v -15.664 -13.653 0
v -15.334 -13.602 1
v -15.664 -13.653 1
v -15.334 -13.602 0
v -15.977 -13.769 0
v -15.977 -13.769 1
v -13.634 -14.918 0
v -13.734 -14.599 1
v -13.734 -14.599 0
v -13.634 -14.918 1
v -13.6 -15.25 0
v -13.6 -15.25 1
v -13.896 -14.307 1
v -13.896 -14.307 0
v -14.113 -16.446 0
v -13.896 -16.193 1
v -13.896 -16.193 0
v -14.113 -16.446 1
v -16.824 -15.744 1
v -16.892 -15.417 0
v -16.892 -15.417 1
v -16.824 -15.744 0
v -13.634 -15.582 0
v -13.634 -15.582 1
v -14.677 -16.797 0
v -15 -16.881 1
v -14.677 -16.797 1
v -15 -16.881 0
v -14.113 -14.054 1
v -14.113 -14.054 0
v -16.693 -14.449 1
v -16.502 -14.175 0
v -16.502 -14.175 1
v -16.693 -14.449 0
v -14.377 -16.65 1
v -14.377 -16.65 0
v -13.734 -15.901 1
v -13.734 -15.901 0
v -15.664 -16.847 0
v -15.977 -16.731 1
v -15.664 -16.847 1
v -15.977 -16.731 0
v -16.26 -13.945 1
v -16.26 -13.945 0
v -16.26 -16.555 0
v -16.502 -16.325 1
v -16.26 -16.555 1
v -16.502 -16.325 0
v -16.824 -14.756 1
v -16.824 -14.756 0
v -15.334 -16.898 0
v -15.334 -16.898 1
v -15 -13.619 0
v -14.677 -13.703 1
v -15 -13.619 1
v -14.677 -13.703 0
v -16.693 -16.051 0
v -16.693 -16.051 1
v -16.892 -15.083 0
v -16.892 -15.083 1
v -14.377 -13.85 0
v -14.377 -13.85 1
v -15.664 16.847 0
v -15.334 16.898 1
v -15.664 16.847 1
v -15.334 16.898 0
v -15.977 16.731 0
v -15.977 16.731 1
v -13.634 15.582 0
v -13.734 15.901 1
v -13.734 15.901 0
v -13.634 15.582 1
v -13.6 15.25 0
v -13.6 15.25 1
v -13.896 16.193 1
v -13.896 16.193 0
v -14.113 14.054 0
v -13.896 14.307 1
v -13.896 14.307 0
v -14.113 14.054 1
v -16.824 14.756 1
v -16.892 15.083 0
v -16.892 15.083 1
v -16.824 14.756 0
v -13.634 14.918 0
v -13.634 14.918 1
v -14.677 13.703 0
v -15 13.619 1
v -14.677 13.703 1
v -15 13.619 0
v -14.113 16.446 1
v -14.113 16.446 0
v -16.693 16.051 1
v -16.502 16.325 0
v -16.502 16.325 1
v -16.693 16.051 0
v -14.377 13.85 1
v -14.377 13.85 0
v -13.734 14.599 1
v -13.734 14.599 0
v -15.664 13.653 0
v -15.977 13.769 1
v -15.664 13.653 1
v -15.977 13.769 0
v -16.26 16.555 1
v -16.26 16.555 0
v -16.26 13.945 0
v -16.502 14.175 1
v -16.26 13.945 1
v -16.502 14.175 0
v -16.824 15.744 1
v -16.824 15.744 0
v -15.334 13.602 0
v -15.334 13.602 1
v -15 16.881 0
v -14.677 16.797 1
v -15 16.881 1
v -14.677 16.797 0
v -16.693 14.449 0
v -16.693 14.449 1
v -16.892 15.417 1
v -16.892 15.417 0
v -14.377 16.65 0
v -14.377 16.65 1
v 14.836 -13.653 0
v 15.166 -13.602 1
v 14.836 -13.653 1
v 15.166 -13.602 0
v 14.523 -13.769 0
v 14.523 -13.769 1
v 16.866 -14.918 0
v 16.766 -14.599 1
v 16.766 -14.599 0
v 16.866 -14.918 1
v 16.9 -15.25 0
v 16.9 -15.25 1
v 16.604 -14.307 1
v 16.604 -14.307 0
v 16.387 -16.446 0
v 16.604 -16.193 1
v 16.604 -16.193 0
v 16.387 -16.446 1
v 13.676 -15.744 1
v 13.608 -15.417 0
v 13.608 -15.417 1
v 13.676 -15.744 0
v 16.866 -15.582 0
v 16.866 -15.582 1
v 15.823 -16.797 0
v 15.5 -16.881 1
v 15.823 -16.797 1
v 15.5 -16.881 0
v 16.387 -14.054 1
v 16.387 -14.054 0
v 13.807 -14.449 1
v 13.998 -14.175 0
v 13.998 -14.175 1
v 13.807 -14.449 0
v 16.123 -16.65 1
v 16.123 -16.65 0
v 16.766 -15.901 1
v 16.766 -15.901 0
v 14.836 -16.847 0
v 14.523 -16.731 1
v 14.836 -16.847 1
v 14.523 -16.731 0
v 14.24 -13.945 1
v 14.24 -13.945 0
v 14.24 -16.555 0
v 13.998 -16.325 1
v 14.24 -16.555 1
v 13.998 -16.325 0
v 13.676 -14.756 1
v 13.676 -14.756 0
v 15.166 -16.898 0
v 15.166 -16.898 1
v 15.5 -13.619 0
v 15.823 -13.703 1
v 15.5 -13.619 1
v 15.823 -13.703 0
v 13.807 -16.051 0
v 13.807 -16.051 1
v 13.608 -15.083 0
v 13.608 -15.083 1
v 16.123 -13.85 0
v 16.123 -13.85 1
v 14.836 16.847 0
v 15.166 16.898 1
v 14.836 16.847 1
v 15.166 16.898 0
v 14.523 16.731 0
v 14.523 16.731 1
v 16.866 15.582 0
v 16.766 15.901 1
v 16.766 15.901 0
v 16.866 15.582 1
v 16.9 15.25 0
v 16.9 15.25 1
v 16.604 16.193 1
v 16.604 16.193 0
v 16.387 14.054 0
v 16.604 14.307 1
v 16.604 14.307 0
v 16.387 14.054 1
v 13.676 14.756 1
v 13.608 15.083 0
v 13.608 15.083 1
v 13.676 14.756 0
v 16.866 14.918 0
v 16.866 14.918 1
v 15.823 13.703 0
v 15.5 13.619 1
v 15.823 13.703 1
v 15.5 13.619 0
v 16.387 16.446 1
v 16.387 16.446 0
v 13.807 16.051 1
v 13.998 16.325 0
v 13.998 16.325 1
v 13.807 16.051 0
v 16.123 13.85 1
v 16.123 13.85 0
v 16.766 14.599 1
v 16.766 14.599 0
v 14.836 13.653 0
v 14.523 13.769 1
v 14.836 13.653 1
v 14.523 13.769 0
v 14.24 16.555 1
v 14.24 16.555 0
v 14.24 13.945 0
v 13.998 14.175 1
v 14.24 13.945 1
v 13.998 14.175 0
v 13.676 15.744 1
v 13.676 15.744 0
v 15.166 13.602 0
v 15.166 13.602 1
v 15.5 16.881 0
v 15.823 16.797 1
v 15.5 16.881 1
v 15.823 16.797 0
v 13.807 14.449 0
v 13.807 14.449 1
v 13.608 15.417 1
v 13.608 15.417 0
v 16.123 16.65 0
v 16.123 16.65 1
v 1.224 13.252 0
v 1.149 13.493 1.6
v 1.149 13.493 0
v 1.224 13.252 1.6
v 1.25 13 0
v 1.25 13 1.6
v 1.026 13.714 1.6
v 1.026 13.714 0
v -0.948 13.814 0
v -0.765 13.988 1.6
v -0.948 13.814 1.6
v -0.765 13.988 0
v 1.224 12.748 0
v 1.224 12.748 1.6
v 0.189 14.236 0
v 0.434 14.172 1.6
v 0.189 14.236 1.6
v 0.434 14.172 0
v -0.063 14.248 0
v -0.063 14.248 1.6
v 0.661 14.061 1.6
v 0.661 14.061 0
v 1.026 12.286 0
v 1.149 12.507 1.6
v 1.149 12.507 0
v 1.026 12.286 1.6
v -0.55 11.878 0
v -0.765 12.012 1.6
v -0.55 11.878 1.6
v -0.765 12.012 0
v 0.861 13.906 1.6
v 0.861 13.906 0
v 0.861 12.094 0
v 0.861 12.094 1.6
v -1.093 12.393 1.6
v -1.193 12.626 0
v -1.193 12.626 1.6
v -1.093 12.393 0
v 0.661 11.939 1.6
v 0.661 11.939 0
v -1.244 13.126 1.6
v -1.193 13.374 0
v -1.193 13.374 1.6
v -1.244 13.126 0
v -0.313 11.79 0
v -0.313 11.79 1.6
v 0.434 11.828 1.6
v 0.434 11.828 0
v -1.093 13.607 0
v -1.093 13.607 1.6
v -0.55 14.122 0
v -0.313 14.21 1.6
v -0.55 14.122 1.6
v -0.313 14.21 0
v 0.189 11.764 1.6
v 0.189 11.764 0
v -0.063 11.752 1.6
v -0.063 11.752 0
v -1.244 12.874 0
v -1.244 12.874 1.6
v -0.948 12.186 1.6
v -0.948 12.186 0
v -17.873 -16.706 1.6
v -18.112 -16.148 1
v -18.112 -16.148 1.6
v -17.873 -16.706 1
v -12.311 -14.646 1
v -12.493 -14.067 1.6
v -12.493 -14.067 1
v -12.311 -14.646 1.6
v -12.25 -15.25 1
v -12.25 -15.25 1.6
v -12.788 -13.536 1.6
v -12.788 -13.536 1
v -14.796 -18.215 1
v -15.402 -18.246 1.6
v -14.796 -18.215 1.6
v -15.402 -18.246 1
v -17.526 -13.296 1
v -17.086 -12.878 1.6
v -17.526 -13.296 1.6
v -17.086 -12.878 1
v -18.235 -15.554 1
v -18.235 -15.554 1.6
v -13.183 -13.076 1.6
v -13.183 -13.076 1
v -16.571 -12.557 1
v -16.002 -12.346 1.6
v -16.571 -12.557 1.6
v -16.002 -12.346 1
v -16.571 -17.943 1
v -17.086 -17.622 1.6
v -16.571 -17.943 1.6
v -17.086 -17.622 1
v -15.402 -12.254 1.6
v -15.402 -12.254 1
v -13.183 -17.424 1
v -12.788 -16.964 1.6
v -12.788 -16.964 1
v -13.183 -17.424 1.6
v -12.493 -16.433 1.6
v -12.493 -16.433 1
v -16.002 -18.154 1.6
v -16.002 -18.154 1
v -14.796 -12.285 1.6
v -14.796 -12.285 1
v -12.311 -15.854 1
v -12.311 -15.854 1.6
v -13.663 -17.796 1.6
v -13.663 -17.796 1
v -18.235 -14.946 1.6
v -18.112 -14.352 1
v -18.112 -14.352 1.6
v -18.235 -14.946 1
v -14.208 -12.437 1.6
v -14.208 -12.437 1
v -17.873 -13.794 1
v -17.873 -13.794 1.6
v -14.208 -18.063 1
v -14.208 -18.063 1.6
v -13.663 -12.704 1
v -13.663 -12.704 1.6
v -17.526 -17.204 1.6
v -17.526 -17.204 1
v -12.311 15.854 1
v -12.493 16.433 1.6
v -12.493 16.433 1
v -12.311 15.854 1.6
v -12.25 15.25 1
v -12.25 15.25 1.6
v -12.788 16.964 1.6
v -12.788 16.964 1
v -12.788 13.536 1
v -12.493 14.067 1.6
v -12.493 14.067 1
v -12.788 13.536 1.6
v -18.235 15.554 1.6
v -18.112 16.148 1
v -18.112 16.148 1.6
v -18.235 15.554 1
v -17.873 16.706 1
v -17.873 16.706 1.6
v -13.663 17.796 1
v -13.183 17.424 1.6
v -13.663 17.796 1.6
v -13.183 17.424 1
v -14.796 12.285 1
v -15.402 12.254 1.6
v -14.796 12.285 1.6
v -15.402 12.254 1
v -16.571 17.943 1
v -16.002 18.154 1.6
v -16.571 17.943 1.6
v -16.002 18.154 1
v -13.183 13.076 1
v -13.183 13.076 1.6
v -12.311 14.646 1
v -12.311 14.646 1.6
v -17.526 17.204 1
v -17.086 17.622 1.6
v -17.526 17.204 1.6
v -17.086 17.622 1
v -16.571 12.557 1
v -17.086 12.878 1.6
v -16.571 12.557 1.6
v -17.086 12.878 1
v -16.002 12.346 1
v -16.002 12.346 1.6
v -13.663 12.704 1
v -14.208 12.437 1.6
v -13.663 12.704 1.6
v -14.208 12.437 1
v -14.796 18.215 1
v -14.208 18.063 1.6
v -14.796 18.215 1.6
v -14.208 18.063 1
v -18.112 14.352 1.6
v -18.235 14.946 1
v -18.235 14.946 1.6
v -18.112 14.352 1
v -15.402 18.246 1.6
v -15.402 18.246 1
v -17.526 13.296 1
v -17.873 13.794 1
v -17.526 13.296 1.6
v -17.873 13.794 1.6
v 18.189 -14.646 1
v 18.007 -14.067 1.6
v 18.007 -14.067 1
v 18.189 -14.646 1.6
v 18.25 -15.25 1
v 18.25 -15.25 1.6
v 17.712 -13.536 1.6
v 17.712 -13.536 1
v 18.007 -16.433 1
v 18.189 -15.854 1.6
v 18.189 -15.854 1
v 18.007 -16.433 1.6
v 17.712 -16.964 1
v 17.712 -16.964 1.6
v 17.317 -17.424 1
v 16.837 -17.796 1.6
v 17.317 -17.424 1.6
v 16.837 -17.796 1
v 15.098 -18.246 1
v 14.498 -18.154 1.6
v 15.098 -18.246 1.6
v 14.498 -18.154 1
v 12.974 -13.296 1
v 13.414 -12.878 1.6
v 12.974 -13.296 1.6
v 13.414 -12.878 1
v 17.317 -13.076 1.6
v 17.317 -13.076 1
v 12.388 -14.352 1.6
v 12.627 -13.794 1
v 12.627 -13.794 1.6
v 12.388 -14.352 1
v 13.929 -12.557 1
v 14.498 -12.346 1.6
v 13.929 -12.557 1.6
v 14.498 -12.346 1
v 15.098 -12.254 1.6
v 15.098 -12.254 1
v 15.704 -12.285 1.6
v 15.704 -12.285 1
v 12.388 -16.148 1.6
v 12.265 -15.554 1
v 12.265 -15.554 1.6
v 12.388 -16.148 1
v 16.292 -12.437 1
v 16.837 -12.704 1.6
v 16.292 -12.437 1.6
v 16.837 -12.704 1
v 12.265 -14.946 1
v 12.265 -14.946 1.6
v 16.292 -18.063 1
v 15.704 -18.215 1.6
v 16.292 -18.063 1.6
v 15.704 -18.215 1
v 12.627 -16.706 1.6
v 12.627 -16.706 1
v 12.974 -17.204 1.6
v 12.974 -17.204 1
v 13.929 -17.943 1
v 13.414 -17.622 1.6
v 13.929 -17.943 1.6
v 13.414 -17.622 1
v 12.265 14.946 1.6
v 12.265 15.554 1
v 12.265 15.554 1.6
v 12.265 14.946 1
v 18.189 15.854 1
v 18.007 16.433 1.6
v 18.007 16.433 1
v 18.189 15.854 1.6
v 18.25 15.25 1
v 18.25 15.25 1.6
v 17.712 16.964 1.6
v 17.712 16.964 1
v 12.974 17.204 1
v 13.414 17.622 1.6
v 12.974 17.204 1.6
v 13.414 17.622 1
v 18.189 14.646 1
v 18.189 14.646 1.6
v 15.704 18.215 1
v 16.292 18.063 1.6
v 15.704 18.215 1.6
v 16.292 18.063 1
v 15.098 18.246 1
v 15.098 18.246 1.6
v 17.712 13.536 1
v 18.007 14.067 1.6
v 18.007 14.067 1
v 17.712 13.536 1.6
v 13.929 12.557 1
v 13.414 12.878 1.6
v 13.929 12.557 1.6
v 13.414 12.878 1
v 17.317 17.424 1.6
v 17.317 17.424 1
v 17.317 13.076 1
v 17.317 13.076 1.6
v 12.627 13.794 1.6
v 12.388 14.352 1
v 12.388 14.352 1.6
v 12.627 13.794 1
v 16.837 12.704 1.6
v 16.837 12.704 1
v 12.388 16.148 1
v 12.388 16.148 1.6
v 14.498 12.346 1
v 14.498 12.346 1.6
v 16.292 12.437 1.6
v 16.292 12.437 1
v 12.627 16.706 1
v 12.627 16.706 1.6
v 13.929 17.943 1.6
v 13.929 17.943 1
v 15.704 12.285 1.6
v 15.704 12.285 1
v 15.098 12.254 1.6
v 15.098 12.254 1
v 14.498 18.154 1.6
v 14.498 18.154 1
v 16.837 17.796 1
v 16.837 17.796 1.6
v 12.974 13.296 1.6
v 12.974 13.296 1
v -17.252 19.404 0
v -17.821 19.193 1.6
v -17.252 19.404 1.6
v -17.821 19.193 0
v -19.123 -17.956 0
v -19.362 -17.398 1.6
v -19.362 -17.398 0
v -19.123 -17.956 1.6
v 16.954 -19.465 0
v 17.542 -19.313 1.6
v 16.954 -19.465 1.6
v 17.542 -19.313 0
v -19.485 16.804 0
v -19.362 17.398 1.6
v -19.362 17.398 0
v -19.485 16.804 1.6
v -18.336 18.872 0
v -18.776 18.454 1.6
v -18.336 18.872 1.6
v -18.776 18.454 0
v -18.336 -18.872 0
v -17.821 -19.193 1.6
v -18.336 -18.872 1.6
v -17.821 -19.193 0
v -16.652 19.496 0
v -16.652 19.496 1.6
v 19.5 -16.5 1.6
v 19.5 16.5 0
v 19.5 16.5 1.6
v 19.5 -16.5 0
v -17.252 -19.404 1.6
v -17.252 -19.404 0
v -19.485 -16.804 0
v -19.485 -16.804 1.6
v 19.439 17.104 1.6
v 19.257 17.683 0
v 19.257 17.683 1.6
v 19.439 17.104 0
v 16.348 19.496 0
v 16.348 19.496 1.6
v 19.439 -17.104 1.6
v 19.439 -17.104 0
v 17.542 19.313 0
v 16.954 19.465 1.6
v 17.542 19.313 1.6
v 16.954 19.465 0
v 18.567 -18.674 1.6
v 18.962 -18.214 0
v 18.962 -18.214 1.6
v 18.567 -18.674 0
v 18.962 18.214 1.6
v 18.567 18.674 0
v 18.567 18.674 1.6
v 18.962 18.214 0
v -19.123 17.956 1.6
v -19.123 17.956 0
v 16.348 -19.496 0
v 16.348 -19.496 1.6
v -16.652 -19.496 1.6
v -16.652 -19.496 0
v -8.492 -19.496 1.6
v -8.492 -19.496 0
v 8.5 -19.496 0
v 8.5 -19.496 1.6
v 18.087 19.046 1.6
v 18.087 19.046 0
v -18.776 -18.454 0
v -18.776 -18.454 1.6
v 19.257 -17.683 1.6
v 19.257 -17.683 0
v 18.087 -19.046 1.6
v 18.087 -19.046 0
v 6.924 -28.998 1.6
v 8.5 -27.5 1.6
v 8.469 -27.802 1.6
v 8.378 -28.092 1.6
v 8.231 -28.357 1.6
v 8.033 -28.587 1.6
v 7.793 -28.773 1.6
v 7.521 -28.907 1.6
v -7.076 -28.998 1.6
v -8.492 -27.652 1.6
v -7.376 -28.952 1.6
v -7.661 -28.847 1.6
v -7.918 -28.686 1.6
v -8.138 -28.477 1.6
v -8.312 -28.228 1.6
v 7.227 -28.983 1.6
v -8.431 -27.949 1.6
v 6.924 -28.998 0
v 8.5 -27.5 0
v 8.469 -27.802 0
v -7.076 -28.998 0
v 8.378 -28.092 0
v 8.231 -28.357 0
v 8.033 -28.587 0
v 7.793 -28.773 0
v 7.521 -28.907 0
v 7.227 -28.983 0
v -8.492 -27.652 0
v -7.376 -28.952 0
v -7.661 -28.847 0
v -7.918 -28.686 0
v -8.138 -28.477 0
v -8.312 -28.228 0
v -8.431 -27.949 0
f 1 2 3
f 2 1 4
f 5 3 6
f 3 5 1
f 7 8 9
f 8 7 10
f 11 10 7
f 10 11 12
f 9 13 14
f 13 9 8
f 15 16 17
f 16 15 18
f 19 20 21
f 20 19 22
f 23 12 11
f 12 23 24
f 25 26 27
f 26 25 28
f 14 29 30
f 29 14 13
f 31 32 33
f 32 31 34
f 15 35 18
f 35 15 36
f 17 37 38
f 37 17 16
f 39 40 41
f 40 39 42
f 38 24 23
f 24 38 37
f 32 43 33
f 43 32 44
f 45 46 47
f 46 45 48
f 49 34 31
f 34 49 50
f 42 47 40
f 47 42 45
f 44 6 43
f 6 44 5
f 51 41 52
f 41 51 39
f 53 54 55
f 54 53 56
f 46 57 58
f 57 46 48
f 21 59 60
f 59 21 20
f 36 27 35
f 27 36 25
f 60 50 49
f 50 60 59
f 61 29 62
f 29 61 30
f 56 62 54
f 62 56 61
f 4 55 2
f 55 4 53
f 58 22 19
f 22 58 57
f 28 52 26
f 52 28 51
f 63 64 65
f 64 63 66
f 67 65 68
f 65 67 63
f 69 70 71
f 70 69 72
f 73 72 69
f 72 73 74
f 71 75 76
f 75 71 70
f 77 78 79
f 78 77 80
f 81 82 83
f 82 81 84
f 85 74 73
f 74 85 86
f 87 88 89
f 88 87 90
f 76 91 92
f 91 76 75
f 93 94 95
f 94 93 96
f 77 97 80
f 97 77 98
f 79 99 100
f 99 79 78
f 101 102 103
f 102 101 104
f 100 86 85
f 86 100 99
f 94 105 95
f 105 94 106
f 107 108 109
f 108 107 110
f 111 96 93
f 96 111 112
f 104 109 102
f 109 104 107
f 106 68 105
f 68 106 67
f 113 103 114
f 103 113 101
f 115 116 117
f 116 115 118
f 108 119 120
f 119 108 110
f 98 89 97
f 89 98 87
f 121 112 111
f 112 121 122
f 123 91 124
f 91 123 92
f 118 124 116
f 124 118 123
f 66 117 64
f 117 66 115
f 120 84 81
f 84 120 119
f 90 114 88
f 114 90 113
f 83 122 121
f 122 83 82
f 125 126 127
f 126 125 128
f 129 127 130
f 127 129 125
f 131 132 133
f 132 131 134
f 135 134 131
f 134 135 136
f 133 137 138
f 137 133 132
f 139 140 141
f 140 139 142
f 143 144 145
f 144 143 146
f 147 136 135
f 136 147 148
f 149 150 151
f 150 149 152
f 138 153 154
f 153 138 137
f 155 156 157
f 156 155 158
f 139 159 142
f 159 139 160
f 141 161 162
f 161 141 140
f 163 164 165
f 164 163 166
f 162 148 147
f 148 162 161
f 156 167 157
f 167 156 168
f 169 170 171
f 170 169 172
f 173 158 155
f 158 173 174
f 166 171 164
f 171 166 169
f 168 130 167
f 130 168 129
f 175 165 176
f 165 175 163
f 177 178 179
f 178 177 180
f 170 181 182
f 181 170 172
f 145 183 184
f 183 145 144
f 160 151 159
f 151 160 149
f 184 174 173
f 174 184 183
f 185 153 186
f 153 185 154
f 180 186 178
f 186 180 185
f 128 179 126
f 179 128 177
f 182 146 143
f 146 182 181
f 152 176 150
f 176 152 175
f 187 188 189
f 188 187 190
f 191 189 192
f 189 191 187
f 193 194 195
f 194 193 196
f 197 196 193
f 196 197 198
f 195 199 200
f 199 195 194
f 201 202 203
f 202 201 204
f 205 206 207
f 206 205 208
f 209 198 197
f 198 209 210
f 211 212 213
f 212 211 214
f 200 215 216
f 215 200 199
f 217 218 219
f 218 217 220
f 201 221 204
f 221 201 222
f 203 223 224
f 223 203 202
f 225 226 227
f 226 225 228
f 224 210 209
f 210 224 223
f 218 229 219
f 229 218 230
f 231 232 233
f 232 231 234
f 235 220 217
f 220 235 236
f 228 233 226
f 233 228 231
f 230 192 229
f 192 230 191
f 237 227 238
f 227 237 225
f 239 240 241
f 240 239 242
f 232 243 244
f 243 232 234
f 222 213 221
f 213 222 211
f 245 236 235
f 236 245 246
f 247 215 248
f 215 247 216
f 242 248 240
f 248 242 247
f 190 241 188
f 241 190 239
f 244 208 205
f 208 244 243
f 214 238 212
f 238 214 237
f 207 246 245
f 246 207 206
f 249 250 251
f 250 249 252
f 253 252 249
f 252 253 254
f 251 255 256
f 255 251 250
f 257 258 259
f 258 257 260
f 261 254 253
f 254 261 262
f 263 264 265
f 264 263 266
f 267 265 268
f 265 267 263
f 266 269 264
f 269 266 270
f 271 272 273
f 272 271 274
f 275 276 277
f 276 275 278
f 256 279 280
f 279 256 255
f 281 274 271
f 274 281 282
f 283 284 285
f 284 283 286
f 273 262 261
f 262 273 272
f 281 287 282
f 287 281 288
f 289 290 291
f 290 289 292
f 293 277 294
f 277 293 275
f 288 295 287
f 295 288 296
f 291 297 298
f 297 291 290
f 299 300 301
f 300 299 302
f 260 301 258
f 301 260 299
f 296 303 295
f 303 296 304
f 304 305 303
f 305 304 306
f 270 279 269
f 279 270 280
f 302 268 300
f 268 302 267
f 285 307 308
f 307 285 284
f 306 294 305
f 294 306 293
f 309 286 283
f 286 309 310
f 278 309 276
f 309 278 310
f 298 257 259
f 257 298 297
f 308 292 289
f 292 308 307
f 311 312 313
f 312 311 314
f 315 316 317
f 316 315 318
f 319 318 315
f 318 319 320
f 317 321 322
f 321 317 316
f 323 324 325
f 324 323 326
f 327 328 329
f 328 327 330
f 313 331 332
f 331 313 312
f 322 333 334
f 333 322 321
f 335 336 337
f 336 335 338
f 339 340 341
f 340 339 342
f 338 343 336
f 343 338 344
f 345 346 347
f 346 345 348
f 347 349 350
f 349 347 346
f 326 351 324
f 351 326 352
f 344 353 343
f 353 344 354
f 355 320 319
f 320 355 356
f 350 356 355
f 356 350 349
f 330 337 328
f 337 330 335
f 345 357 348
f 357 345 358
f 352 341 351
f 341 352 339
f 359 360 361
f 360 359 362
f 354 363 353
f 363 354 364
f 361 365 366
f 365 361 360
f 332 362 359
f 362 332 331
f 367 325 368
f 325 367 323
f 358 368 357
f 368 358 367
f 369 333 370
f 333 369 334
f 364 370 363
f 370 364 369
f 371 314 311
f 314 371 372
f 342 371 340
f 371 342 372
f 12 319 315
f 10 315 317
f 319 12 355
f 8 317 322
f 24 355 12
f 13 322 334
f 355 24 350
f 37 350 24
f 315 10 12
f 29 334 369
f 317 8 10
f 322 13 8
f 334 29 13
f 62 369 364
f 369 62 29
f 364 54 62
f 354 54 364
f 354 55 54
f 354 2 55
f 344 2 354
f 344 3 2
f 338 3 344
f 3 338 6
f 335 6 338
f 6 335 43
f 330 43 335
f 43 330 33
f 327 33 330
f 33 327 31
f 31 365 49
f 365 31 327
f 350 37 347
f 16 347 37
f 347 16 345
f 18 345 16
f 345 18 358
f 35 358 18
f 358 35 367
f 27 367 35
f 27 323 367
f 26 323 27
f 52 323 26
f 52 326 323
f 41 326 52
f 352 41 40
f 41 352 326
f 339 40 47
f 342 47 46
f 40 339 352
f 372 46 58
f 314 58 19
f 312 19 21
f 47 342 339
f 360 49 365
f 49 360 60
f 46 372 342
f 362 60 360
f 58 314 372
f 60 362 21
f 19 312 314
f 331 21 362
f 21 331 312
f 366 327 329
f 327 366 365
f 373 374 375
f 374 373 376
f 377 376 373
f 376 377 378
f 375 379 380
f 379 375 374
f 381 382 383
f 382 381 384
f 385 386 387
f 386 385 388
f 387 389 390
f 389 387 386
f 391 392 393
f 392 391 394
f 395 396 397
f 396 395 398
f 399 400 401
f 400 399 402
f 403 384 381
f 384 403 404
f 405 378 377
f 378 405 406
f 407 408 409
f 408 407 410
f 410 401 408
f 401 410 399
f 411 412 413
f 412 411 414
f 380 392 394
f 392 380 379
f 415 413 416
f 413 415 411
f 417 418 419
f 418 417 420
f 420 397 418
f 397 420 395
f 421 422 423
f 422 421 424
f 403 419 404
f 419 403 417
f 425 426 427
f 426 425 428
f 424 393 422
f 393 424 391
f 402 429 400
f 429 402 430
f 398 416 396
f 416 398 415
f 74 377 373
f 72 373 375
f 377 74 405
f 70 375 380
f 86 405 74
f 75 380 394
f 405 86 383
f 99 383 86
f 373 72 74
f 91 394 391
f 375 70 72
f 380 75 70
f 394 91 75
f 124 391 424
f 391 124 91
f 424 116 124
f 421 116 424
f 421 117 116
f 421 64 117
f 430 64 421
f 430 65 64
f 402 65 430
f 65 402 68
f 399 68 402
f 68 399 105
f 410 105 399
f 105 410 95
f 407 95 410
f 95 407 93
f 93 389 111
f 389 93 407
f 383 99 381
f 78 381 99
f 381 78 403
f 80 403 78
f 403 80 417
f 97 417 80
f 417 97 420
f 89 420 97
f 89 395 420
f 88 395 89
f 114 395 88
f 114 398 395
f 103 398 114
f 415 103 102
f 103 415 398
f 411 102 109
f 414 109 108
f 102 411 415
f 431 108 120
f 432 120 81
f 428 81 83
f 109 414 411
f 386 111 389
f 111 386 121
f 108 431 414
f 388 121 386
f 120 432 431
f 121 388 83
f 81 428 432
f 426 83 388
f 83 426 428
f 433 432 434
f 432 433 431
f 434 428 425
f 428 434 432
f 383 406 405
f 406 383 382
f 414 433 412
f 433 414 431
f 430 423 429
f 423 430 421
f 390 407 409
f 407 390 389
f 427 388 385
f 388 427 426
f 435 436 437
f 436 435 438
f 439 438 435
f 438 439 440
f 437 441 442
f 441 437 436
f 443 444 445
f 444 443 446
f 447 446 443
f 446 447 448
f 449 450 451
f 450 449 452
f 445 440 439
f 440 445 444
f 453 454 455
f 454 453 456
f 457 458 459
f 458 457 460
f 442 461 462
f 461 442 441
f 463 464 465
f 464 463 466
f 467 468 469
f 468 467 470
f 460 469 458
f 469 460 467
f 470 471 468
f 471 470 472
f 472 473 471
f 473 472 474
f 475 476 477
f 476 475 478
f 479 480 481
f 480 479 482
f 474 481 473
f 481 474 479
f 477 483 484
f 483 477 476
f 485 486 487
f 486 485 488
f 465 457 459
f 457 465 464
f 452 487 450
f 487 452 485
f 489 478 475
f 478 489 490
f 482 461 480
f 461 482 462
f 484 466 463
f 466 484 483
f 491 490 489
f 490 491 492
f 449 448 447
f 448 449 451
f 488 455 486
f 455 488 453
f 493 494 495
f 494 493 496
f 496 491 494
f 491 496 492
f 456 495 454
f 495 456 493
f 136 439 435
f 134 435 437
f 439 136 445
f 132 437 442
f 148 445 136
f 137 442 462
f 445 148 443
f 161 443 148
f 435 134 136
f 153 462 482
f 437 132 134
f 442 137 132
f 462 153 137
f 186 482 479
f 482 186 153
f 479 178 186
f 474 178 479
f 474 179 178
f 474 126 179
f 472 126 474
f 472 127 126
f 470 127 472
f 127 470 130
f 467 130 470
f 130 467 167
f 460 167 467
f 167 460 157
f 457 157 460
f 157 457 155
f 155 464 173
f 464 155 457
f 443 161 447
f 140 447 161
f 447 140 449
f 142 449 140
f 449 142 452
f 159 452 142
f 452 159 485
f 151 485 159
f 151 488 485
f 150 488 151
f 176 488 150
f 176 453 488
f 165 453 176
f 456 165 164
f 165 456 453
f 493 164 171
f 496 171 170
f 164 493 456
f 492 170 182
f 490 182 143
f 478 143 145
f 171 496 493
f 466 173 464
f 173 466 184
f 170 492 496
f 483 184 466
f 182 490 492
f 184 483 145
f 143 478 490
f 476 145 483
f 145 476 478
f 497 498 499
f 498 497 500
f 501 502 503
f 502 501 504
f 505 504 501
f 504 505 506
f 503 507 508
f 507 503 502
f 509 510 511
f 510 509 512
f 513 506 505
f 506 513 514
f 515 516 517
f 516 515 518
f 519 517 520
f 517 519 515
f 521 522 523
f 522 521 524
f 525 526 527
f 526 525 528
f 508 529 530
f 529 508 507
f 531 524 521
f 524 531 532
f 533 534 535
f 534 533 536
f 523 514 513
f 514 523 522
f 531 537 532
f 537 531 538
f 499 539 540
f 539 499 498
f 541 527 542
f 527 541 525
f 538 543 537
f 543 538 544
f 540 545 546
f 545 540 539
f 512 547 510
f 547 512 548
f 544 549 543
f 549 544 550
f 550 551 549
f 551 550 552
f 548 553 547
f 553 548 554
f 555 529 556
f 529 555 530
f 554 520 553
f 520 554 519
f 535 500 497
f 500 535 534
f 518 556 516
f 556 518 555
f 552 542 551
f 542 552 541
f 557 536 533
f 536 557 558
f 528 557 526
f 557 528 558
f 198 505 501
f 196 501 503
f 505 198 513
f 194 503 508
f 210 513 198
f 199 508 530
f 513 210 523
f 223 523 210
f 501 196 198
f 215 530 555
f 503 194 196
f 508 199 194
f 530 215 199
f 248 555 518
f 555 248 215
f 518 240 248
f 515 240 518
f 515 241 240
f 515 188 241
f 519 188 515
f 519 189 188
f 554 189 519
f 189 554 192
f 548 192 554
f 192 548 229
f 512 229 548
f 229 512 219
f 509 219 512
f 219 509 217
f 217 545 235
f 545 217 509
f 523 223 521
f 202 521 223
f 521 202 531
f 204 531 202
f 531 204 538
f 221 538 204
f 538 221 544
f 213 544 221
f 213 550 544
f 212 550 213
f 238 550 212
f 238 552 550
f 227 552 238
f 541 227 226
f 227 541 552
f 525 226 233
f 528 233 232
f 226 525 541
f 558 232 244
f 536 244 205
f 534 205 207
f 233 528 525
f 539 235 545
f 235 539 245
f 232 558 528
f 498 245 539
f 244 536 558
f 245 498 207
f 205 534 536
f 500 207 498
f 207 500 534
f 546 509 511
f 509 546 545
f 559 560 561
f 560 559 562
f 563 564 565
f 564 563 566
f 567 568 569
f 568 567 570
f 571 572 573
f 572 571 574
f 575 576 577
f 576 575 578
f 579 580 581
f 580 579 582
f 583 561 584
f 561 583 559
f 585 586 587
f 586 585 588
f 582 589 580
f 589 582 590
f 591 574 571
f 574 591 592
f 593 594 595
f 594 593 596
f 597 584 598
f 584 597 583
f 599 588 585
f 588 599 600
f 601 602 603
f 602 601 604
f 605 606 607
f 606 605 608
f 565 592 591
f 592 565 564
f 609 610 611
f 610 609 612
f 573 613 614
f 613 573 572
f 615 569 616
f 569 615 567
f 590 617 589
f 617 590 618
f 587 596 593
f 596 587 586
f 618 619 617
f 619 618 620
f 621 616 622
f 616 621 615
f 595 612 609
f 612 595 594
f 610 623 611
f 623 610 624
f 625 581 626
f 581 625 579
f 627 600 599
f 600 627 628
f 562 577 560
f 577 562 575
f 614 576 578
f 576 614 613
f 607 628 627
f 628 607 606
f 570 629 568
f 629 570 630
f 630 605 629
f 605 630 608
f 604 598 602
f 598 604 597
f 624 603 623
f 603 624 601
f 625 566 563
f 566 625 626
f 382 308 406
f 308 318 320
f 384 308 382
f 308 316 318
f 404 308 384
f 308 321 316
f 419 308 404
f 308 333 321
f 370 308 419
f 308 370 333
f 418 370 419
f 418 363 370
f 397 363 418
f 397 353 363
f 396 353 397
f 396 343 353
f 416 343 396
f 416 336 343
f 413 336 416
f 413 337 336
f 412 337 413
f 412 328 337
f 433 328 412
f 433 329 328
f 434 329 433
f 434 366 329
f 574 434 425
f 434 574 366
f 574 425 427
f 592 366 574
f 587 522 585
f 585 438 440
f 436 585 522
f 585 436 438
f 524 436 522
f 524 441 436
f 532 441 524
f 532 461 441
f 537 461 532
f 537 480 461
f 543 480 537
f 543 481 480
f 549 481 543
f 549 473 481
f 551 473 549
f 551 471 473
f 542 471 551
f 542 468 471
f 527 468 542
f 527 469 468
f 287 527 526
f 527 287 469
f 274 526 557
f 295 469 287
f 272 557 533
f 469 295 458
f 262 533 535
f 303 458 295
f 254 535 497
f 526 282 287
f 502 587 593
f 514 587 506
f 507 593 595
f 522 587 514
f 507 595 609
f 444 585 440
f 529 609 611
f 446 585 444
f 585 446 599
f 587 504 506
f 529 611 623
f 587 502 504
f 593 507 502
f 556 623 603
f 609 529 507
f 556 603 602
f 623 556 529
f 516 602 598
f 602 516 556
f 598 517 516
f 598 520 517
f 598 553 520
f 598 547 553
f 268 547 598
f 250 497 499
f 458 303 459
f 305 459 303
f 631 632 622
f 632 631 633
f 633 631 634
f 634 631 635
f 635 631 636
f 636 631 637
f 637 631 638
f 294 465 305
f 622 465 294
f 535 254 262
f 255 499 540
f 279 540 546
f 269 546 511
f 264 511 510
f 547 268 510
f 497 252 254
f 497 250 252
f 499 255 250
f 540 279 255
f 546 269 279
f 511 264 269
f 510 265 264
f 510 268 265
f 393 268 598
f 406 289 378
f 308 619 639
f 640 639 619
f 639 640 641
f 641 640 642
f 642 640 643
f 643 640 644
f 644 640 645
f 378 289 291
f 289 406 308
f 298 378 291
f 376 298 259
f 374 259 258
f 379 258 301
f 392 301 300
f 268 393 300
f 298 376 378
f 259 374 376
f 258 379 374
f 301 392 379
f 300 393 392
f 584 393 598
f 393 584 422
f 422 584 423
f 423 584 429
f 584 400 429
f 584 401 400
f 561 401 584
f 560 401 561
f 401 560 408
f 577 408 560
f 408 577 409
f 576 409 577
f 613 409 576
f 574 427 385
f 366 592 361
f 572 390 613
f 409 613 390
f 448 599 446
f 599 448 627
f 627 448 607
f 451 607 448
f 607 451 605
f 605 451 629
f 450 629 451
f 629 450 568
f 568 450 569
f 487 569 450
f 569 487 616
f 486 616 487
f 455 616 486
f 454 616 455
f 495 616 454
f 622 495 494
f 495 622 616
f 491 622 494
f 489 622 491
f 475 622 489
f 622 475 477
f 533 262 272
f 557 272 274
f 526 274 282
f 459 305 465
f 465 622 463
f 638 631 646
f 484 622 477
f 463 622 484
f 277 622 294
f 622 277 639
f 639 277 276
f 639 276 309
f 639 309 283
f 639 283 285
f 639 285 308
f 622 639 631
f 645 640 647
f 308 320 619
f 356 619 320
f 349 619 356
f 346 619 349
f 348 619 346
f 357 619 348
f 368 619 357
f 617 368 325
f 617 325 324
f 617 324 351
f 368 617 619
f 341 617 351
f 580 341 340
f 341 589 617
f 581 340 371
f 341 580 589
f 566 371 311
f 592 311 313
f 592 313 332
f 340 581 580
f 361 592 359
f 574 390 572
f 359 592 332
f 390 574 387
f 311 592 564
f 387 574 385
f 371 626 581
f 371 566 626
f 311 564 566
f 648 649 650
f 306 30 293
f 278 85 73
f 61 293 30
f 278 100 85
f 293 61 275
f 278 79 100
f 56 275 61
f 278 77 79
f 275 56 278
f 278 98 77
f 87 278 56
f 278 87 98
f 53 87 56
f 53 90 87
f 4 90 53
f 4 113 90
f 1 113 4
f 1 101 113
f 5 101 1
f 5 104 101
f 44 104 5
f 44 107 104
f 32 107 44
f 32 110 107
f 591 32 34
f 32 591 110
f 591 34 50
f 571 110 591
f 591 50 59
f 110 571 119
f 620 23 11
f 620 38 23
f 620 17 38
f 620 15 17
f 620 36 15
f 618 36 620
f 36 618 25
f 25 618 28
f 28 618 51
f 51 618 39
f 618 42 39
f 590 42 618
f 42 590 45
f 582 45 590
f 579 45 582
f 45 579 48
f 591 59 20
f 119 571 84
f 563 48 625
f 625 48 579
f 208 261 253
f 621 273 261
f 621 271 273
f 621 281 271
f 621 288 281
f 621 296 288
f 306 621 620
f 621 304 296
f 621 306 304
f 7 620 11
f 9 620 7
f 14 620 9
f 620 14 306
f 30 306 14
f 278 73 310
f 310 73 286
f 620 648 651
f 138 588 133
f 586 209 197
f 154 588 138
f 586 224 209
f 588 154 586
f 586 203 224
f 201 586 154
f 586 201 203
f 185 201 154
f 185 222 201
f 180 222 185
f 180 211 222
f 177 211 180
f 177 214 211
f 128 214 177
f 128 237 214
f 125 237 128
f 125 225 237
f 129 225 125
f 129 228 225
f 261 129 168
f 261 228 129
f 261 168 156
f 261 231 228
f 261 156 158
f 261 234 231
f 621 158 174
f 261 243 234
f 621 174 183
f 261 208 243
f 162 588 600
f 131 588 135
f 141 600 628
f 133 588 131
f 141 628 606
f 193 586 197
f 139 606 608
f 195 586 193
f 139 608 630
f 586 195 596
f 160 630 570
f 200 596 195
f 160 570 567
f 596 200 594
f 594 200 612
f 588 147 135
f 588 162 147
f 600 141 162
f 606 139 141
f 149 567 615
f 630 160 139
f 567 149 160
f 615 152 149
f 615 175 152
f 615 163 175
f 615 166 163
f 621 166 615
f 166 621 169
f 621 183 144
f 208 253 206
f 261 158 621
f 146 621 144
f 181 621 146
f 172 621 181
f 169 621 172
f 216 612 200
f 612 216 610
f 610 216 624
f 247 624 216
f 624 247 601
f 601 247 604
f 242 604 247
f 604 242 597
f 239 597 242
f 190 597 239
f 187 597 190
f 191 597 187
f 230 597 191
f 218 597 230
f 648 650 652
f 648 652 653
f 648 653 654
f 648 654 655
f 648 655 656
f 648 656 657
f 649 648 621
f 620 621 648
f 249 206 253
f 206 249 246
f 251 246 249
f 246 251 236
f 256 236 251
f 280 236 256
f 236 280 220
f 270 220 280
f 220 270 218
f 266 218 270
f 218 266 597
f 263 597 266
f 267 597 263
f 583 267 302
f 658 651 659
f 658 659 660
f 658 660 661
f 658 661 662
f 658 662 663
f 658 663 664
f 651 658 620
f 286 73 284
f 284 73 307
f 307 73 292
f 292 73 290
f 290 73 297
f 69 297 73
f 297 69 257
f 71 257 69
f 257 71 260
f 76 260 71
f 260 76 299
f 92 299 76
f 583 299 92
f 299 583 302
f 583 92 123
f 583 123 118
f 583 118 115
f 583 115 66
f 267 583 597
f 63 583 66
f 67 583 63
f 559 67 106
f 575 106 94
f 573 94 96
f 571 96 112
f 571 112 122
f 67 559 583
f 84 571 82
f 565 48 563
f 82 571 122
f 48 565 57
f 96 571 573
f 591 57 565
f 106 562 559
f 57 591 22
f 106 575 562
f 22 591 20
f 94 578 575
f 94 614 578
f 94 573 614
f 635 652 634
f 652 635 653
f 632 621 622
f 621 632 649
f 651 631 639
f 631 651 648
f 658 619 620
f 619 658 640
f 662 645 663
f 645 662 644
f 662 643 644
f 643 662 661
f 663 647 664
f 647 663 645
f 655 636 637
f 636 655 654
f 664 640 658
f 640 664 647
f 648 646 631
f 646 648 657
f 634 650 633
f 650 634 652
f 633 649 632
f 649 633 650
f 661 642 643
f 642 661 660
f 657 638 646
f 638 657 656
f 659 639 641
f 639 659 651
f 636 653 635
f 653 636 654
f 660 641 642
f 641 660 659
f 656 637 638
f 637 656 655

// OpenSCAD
$fn=31;
w = 33;
h = 33;
hd = 30.5;
t=1.6;
w_gps = 14;
h_gps = 22;

module corner(){
    cylinder(h=t, d=6);
    }
module screwhole(){
    translate([0, 0, -0.01])cylinder(h=10, d=3.3);
    }

module screwholes(){
    translate([-hd/2, -hd/2, 0])screwhole();
    translate([-hd/2, hd/2, 0])screwhole();
    translate([hd/2, -hd/2, 0])screwhole();
    translate([hd/2, hd/2, 0])screwhole();
    translate([0, 13, 0])cylinder(d=2.5, h=10, center=true);
    }

module recess(){
    translate([0, 0, 1])cylinder(h=5, d=6);
    }
    
module recesses(){
    translate([-hd/2, -hd/2, 0])recess();
    translate([-hd/2, hd/2, 0])recess();
    translate([hd/2, -hd/2, 0])recess();
    translate([hd/2, hd/2, 0])recess();
    }
difference(){
    hull(){
        translate([-w/2, -h/2, 0])corner();
        translate([-w/2, h/2, 0])corner();
        translate([w/2, -h/2, 0])corner();
        translate([w/2, h/2, 0])corner();
        }
    screwholes();
    recesses();
}

hull(){
    translate([-w_gps/2, 0, 0])cylinder(d=3, h=t);
    translate([w_gps/2, 0, 0])cylinder(d=3, h=t);
    translate([-w_gps/2, -h/2 -h_gps/2, 0])cylinder(d=3, h=t);
    translate([w_gps/2, -h/2 -h_gps/2, 0])cylinder(d=3, h=t);
    }
